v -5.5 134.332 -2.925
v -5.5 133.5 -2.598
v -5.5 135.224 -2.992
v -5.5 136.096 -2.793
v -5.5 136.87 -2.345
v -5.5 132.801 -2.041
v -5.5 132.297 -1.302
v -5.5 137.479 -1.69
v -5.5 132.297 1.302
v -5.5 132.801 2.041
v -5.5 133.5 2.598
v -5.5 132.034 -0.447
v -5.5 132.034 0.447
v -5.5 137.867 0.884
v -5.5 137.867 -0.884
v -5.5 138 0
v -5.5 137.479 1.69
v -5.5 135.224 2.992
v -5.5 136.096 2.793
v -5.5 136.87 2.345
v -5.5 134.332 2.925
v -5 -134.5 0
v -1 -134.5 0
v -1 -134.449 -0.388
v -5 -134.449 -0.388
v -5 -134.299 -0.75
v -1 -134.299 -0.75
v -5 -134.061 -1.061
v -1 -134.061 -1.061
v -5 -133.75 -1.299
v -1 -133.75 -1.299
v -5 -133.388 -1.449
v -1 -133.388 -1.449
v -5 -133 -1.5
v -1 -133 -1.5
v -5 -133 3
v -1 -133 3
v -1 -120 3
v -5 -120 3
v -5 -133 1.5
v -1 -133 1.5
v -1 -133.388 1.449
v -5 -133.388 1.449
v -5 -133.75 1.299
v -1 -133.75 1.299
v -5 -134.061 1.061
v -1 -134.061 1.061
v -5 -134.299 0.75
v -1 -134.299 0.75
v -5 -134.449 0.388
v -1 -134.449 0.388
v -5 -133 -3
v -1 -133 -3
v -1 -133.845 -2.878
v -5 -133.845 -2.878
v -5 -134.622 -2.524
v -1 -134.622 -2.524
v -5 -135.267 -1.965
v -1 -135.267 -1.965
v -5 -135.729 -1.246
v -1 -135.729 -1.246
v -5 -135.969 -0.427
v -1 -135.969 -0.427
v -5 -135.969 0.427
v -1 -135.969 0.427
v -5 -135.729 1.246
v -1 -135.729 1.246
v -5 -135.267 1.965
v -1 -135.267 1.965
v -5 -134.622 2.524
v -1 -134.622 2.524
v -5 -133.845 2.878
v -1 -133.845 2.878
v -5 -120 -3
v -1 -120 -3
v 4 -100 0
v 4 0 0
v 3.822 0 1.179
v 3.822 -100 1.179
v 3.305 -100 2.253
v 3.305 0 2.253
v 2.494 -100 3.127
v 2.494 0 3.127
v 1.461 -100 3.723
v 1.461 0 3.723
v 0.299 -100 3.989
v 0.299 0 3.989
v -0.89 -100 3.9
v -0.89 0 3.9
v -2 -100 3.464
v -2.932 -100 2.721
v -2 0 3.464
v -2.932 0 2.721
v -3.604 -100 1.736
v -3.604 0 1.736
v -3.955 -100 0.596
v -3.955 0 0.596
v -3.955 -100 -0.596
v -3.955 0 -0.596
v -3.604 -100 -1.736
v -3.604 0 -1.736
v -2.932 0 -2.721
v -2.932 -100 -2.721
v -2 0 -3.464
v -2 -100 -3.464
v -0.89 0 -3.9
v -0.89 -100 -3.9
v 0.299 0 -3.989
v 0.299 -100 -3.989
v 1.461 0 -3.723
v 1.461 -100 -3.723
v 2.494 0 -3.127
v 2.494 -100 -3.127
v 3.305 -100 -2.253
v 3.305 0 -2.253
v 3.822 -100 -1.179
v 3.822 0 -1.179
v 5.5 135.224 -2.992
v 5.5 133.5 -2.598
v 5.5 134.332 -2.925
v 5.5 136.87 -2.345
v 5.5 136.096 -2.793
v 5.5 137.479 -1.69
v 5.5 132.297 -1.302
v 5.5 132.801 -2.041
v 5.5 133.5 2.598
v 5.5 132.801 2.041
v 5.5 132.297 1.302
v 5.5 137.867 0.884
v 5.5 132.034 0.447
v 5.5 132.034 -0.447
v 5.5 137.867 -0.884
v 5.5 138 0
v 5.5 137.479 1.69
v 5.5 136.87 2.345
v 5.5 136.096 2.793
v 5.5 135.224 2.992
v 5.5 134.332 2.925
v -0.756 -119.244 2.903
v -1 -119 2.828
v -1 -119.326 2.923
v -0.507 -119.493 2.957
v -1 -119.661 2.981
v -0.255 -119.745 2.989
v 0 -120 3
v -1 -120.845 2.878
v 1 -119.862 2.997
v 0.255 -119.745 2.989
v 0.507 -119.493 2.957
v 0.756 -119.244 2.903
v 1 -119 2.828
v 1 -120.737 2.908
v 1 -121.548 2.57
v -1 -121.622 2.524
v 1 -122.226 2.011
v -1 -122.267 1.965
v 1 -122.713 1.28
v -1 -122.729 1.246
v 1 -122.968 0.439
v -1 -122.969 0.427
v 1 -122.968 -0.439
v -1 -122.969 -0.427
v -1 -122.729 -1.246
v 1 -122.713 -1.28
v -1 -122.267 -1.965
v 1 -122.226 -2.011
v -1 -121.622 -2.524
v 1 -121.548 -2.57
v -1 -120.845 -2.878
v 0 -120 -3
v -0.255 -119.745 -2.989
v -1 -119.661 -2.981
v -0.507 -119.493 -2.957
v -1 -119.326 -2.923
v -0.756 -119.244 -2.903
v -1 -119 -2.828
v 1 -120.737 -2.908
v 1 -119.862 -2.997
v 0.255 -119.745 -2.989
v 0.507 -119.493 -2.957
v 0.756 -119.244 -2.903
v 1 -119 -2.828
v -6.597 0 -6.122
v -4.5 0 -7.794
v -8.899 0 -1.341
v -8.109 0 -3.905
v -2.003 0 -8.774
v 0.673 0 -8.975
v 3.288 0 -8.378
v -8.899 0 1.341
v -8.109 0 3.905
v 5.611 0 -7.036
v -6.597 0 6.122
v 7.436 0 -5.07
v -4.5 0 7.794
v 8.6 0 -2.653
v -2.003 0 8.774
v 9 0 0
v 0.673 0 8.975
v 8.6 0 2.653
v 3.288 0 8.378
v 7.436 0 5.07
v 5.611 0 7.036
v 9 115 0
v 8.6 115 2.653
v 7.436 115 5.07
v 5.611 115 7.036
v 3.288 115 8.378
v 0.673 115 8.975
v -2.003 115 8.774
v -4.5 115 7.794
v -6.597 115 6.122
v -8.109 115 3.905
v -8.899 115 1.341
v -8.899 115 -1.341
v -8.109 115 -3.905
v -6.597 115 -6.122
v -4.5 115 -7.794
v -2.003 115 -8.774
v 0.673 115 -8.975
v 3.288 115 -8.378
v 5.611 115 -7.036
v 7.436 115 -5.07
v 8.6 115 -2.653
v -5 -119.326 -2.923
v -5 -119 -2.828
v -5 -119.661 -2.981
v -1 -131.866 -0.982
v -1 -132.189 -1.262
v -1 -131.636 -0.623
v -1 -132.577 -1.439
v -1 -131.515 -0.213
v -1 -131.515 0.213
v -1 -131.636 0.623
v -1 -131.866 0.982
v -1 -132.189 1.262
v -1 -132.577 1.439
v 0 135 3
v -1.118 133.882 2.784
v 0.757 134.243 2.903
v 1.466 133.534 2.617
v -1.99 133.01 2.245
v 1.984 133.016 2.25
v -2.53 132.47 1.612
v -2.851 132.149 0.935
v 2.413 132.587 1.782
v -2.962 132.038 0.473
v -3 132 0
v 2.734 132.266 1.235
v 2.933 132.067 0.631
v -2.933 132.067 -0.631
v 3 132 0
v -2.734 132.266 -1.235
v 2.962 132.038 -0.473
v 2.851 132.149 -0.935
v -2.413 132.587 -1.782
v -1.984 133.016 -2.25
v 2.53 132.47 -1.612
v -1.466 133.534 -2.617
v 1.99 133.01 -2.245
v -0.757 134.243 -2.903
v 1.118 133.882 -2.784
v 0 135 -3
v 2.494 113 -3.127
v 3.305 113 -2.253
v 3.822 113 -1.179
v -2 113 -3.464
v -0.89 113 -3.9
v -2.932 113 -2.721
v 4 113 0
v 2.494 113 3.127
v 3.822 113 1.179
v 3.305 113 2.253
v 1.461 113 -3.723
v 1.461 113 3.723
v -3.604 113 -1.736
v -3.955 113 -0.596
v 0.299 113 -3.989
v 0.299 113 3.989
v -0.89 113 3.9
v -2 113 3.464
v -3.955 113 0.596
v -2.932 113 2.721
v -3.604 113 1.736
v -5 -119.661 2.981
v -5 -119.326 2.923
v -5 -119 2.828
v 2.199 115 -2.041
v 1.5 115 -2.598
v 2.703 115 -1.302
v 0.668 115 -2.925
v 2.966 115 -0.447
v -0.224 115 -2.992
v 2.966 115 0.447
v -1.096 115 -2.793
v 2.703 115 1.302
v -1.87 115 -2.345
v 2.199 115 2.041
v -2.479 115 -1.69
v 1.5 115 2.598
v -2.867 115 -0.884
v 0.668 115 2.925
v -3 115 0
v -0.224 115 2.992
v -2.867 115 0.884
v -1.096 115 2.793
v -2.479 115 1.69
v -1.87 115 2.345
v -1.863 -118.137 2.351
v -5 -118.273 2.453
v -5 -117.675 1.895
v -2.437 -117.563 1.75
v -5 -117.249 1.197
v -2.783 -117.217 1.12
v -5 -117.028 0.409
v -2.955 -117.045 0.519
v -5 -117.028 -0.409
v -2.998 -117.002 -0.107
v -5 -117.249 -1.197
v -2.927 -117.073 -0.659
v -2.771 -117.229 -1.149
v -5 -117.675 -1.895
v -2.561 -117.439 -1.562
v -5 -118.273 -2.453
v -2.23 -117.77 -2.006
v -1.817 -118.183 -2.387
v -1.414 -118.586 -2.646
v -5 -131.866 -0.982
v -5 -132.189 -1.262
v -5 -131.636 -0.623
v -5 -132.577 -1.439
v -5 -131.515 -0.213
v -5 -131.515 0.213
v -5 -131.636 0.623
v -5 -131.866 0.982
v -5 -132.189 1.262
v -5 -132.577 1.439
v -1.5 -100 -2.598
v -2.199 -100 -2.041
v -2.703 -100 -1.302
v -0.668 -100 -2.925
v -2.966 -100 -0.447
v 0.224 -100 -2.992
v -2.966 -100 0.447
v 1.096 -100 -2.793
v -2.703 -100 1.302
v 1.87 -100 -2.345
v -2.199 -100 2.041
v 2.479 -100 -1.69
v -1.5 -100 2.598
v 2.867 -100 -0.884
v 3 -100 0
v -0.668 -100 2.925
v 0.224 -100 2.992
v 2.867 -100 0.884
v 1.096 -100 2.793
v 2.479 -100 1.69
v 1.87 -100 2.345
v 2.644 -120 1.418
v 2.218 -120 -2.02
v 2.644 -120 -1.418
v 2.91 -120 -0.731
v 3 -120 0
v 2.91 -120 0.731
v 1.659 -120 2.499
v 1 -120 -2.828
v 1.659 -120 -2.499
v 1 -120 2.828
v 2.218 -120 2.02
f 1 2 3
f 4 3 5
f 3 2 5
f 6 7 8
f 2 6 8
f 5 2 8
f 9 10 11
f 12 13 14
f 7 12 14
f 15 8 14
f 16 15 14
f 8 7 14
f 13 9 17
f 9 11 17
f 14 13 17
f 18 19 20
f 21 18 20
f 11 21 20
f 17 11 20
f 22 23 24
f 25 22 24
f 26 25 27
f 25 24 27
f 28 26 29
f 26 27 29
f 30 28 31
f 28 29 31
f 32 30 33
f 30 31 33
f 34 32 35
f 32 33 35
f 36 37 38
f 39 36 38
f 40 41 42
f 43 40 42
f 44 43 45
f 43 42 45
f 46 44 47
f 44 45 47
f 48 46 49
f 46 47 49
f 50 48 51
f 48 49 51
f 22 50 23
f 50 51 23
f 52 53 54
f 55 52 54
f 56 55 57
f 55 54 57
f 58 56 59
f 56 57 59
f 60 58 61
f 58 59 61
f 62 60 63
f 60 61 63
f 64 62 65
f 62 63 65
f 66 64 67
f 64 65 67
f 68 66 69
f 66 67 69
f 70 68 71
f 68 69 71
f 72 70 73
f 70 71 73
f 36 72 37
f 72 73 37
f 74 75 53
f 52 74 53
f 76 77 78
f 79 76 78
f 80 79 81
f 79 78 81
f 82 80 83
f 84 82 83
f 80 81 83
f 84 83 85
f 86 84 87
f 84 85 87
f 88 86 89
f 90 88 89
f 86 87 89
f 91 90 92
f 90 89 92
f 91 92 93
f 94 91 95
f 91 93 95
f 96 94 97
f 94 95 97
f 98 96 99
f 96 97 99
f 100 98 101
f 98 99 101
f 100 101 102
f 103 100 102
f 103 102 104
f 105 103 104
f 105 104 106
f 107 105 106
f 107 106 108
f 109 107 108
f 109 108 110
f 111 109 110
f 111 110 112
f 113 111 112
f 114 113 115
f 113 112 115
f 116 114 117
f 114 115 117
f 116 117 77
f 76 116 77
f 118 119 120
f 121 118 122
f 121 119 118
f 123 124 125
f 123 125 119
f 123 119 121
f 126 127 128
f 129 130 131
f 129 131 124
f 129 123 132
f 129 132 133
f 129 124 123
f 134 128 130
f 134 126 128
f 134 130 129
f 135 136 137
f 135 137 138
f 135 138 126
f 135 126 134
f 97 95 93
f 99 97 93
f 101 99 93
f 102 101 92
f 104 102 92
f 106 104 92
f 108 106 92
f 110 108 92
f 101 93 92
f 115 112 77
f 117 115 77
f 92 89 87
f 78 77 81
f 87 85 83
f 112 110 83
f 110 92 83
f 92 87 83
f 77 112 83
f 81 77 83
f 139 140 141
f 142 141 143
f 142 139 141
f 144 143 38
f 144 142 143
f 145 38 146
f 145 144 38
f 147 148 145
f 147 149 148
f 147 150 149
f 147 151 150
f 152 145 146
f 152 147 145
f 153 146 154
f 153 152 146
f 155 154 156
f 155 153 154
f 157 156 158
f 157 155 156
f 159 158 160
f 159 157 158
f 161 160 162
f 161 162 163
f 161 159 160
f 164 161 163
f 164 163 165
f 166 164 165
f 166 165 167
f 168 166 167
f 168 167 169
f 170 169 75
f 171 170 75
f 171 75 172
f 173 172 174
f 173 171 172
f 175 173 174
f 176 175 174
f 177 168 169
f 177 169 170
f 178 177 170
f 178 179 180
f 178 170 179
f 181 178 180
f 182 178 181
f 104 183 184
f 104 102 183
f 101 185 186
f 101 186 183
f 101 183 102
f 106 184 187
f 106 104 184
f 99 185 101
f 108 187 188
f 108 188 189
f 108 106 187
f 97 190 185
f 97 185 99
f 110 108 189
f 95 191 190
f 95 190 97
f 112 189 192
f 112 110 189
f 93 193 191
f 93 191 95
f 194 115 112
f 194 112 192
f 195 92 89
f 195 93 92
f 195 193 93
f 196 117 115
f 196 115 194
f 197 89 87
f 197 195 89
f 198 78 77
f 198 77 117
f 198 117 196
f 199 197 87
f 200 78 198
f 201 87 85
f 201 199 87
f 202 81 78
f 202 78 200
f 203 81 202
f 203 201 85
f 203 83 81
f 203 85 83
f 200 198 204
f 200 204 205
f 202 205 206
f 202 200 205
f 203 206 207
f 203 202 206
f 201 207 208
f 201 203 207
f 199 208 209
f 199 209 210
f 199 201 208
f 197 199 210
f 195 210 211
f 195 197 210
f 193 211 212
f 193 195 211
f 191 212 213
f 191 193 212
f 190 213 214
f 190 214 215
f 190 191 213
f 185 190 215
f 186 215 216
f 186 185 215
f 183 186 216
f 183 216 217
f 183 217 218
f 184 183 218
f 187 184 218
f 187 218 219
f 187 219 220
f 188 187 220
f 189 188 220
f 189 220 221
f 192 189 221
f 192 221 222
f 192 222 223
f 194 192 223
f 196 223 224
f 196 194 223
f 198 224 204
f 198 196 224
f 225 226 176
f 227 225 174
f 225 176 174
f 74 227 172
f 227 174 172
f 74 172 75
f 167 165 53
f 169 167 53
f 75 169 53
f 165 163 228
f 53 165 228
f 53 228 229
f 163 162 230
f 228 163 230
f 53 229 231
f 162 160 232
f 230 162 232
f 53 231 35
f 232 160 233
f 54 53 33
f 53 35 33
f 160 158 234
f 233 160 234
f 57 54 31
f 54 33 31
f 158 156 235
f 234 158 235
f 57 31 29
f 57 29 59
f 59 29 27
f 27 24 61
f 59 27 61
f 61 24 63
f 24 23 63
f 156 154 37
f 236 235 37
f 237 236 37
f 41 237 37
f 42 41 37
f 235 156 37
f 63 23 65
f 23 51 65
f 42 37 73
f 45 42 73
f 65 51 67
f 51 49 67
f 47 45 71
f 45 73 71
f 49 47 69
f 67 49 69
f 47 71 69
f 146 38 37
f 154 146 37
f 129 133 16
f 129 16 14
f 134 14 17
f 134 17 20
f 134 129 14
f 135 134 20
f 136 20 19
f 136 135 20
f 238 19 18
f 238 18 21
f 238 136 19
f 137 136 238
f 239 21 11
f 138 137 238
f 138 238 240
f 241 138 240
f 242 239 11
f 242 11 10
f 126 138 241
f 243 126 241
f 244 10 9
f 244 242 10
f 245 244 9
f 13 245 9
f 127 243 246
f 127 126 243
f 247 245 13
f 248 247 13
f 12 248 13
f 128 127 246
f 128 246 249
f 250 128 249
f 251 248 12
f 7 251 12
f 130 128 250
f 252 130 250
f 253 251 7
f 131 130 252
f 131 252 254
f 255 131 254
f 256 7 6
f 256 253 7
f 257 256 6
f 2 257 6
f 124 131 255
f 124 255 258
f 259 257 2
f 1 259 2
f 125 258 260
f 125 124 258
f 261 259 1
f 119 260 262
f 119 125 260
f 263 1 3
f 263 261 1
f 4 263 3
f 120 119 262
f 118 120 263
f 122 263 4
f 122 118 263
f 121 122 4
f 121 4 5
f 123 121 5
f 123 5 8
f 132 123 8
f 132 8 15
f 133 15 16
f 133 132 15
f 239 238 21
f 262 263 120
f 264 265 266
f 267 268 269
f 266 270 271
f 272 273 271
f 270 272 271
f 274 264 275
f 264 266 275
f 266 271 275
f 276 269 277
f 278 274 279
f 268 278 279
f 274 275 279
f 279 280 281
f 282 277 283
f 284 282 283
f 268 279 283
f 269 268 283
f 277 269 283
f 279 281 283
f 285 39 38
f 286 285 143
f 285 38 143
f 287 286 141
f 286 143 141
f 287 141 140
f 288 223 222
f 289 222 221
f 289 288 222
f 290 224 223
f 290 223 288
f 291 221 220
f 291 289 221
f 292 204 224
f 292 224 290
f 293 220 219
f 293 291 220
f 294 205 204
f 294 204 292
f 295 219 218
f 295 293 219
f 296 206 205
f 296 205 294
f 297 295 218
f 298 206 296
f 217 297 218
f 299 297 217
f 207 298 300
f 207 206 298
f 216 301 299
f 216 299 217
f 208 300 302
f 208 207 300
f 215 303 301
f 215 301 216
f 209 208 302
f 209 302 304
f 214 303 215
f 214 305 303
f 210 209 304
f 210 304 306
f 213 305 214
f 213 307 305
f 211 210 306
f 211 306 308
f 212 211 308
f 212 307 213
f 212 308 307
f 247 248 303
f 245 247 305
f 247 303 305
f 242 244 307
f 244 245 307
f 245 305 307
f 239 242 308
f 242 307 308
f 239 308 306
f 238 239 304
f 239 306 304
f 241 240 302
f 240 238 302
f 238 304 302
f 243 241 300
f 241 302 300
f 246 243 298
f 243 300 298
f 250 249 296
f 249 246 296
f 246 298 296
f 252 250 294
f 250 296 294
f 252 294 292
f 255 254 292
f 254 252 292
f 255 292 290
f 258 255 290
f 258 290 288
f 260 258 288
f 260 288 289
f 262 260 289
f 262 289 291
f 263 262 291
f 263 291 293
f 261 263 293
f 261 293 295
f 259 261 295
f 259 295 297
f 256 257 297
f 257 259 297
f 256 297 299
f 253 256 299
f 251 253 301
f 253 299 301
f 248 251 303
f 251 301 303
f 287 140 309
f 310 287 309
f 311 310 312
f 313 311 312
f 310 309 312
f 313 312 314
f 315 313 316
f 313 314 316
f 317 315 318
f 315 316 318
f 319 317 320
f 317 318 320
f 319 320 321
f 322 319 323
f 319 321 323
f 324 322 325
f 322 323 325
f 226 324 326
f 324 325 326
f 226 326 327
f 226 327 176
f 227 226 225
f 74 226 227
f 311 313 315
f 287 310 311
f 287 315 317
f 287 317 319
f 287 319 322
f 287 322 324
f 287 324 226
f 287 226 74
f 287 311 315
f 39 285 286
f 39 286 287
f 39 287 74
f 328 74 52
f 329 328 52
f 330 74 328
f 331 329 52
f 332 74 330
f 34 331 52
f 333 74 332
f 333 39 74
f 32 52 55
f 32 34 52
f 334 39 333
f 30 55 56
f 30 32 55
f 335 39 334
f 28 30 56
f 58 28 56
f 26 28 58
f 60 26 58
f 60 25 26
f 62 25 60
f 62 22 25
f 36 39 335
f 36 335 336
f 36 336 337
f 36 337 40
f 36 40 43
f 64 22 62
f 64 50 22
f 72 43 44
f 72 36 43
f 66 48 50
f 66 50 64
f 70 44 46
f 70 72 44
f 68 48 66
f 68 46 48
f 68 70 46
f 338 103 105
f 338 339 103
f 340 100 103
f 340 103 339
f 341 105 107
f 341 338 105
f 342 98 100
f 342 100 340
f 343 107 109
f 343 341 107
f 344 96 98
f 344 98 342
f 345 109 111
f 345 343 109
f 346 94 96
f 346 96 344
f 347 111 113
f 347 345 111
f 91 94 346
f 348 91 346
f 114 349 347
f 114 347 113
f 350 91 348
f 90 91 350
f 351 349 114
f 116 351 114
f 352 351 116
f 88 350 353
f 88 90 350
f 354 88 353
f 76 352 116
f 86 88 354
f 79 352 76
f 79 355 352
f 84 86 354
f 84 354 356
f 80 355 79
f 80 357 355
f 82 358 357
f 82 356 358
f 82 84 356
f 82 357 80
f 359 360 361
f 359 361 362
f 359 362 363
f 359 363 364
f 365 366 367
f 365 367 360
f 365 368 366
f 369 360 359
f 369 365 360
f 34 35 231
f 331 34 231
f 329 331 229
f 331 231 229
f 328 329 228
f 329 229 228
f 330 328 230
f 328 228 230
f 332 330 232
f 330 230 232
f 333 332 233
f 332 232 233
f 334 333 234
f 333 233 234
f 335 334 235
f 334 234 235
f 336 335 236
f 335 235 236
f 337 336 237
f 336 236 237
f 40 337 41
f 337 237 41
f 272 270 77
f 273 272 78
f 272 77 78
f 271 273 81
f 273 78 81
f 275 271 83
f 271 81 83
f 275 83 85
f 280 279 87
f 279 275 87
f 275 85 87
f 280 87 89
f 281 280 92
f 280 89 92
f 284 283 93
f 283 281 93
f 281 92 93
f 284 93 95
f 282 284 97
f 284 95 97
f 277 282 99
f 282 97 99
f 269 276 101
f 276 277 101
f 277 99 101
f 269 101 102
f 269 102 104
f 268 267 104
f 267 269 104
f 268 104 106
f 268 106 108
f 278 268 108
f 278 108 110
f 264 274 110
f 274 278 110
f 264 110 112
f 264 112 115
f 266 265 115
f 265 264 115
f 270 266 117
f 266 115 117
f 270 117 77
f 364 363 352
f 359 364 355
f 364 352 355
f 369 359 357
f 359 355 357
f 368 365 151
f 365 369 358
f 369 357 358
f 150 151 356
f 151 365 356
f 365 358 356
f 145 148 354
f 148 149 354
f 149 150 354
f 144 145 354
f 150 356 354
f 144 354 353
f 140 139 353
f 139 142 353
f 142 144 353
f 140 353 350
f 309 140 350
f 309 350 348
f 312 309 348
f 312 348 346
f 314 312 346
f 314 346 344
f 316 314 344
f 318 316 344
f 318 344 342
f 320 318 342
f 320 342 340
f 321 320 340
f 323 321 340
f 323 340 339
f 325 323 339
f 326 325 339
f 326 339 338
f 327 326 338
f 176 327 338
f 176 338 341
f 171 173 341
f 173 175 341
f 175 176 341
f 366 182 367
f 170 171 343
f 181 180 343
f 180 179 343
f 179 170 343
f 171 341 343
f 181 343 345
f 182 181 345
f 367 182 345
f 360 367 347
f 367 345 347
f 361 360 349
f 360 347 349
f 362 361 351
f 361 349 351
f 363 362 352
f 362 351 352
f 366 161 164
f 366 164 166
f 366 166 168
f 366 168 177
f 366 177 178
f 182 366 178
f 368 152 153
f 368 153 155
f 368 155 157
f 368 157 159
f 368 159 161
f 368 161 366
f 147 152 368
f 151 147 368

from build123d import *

# Parameters (mm, degrees)
F4_R          = 4
F5_DEPTH      = 100
F4_R_2        = 9
F6_DEPTH      = 115
F7_R          = 4
F7_R_2        = 3
F8_DEPTH      = 2
F9_DEPTH      = 20
F9_DEPTH_BACK = 1
F10_R         = 3
F11_DEPTH     = 20
F12_R         = 3
F13_DEPTH     = 5.5
F14_DEPTH     = 1
F16_DEPTH     = 4


with BuildPart() as f5:
    # F4 (on Front) → F5 (new body)
    with BuildSketch(Plane.XZ):
        Circle(F4_R)
    extrude(amount=F5_DEPTH)

    # F10 (on face) → F11 (join)
    with BuildSketch(Plane.XZ.offset(100)):
        Circle(F10_R)
    extrude(amount=F11_DEPTH)

    # F12 (on Right) → F14 (join, symmetric)
    with BuildSketch(Plane.YZ):
        with Locations((-120, 0)):
            Circle(F12_R)
    extrude(amount=F14_DEPTH, both=True)

    # F15 (on face) → F16 (join)
    with BuildSketch(Plane(origin=(-1, 0, 0), x_dir=(0, -1, 0), z_dir=(-1, 0, 0))):
        with BuildLine():
            Line((120, 2.8284271247), (119, 2.8284271247))
            ThreePointArc((119, 2.8284271247), (117, 0), (119, -2.8284271247))
            Line((119, -2.8284271247), (120, -2.8284271247))
            Line((120, -2.8284271247), (120, 2.8284271247))
        make_face()
        with BuildLine():
            ThreePointArc((120, -3), (122.1213203436, -2.1213203436), (123, 0))
            ThreePointArc((123, 0), (122.1213203436, 2.1213203436), (120, 3))
            ThreePointArc((120, 3), (119.4926940638, 2.956795679), (119, 2.8284271247))
            Line((119, 2.8284271247), (120, 2.8284271247))
            Line((120, 2.8284271247), (120, -2.8284271247))
            Line((120, -2.8284271247), (119, -2.8284271247))
            ThreePointArc((119, -2.8284271247), (119.4926940638, -2.956795679), (120, -3))
        make_face()
        with BuildLine():
            ThreePointArc((120, 3), (122.1213203436, 2.1213203436), (123, 0))
            ThreePointArc((123, 0), (122.1213203436, -2.1213203436), (120, -3))
            Line((120, -3), (133, -3))
            Line((133, -3), (133, -1.5))
            ThreePointArc((133, -1.5), (131.5, 0), (133, 1.5))
            Line((133, 1.5), (133, 3))
            Line((133, 3), (120, 3))
        make_face()
        with BuildLine():
            ThreePointArc((133, -3), (136, 0), (133, 3))
            Line((133, 3), (133, 1.5))
            ThreePointArc((133, 1.5), (134.0606601718, 1.0606601718), (134.5, 0))
            ThreePointArc((134.5, 0), (134.0606601718, -1.0606601718), (133, -1.5))
            Line((133, -1.5), (133, -3))
        make_face()
    extrude(amount=F16_DEPTH)


with BuildPart() as f6:
    # F4 (on Front) → F6 (new body)
    with BuildSketch(Plane.XZ):
        Circle(F4_R_2)
        Circle(F4_R, mode=Mode.SUBTRACT)
    extrude(amount=-F6_DEPTH)

    # F7 (on face) → F8 (join)
    with BuildSketch(Plane(origin=(0, 115, 0), x_dir=(-1, 0, 0), z_dir=(0, 1, 0))):
        Circle(F7_R)
        Circle(F7_R_2, mode=Mode.SUBTRACT)
        Circle(F7_R_2)
    extrude(amount=-F8_DEPTH)

    # F7 (on face) → F9 (join, two sides)
    with BuildSketch(Plane(origin=(0, 115, 0), x_dir=(-1, 0, 0), z_dir=(0, 1, 0))) as f9_sk:
        Circle(F7_R_2)
    extrude(amount=F9_DEPTH)
    extrude(f9_sk.sketch, amount=-F9_DEPTH_BACK)

    # F12 (on Right) → F13 (join, symmetric)
    with BuildSketch(Plane.YZ):
        with Locations((135, 0)):
            Circle(F12_R)
    extrude(amount=F13_DEPTH, both=True)


solid = Compound([f5.part, f6.part])
